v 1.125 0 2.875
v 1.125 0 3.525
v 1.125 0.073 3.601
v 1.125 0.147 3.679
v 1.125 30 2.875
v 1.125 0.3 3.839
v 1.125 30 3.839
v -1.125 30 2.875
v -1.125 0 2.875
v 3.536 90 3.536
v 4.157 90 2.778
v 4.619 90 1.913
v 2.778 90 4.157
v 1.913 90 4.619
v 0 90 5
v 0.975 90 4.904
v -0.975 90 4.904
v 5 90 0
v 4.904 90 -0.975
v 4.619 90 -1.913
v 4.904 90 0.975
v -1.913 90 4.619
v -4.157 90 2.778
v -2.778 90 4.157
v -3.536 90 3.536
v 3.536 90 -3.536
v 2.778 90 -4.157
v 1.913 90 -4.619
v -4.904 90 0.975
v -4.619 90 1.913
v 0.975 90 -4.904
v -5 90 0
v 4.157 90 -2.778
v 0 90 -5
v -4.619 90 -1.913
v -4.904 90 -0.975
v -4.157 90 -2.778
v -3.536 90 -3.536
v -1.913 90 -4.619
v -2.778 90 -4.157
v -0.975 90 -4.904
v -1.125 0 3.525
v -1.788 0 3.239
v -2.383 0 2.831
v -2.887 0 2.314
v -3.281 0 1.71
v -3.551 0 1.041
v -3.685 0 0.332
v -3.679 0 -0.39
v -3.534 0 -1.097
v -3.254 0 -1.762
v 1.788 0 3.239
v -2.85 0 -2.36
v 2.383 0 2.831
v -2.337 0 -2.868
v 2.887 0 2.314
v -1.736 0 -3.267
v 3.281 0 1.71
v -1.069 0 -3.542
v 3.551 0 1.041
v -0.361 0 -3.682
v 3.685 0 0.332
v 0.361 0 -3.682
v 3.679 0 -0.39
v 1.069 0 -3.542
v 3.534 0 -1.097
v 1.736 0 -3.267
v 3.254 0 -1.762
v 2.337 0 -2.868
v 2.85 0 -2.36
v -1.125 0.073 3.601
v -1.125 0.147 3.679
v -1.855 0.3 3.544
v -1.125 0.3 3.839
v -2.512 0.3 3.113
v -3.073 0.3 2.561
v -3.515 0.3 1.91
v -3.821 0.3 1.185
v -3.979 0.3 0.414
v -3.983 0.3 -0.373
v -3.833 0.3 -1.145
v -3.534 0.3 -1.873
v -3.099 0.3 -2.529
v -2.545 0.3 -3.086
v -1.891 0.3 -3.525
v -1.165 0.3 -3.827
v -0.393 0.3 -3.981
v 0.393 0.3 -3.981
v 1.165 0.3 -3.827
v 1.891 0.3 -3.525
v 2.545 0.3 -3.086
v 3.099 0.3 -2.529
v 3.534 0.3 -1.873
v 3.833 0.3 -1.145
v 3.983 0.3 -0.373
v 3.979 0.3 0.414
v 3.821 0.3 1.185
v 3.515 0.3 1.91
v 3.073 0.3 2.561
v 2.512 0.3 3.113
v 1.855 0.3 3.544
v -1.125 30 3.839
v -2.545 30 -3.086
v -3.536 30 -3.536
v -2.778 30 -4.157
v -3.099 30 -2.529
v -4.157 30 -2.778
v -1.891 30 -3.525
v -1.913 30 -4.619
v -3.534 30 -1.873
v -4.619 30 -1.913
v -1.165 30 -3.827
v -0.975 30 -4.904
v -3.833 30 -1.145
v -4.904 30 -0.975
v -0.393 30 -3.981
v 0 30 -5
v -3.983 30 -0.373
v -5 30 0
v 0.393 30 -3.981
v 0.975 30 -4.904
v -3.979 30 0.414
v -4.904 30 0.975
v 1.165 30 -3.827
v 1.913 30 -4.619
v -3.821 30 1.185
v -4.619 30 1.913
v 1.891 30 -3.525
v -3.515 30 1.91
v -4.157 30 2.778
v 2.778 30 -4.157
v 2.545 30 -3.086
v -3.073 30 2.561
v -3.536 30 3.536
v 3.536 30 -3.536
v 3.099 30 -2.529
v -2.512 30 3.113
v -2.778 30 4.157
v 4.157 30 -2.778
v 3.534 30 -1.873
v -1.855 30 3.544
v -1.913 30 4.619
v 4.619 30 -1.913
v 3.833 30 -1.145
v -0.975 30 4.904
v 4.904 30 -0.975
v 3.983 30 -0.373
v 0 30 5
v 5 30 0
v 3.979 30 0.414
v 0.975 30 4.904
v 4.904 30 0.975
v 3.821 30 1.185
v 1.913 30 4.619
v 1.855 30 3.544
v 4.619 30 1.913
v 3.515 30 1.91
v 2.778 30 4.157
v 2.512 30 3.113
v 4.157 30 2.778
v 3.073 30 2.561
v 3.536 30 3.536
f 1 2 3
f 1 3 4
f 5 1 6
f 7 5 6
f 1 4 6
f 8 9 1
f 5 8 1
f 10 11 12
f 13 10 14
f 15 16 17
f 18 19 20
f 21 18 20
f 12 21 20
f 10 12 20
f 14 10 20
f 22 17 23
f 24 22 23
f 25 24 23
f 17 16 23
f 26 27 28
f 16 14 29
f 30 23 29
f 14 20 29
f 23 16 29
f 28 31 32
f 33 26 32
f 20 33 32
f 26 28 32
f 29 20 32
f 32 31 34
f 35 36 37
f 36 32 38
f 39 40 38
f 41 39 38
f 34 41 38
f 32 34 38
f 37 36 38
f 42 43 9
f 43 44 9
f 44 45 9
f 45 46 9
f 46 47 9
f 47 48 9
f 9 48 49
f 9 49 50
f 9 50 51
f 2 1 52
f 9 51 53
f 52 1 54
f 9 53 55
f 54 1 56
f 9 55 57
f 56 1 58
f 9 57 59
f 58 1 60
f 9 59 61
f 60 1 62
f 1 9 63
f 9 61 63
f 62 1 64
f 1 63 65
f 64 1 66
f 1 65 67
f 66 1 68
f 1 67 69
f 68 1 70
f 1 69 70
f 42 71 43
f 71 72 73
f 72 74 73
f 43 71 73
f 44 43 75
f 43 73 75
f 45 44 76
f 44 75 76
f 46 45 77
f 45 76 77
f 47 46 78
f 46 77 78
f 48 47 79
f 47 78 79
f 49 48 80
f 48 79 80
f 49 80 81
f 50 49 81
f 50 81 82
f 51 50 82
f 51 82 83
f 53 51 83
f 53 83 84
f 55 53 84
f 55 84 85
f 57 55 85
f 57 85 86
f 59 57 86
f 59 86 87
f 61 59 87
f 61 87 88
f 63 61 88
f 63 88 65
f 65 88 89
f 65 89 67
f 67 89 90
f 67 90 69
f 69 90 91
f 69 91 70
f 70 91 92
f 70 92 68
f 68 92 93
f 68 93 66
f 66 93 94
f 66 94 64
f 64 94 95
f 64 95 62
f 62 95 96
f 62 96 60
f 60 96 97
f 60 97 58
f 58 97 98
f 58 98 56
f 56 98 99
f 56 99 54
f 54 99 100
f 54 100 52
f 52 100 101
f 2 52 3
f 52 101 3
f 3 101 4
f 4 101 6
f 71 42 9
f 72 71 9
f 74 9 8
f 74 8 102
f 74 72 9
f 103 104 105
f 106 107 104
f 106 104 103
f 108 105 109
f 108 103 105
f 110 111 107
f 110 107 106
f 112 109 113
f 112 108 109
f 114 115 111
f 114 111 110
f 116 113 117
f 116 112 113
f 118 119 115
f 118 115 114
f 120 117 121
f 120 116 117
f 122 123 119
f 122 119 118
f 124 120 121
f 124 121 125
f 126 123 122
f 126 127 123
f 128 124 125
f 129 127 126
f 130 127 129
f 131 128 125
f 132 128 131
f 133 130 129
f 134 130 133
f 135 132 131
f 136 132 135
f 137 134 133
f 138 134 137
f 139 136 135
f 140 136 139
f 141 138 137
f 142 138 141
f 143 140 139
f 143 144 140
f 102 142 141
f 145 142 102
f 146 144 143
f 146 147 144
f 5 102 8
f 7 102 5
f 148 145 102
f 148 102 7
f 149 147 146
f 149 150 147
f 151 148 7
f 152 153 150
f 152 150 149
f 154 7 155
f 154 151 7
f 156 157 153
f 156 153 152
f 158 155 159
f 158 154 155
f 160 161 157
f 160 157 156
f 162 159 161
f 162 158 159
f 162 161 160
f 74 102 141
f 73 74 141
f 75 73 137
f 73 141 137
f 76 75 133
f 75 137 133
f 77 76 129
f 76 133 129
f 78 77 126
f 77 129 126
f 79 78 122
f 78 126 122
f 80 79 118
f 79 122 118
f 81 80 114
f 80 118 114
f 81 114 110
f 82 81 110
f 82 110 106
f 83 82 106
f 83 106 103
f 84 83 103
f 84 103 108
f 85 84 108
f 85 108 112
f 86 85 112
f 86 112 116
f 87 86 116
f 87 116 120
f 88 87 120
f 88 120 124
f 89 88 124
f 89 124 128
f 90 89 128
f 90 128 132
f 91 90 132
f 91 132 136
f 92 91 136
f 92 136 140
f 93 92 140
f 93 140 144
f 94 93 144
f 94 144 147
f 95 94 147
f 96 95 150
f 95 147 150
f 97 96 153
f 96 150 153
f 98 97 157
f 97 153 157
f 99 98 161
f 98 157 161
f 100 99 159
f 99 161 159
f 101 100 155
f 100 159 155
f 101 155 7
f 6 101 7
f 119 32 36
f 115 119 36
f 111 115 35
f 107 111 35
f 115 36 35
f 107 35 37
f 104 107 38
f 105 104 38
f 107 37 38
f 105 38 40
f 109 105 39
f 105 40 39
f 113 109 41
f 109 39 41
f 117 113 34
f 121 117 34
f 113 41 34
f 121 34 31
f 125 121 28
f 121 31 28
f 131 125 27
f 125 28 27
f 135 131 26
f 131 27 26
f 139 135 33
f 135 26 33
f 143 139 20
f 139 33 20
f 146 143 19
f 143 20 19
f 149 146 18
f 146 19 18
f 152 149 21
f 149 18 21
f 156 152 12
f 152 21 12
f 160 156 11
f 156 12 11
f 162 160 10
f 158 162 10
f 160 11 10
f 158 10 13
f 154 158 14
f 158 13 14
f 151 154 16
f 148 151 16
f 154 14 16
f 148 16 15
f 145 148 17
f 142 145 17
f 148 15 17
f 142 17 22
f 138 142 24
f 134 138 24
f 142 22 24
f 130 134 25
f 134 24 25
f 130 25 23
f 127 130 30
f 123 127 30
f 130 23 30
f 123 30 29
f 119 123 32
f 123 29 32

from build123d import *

# Parameters (mm, degrees)
CHAMFER1_SIZE      = 0.3
SKETCH2_W          = 2.25
SKETCH2_H          = 2.25
CUT_EXTRUDE1_DEPTH = 30


with BuildPart() as part:
    # Sketch1 → Revolve1 (revolve)
    with BuildSketch(Plane.XY, mode=Mode.PRIVATE) as revolve1_sk:
        Polygon((0, 0), (4, 0), (4, 30), (5, 30), (5, 90), (0, 90), align=None)
    revolve(revolve1_sk.sketch.rotate(Axis((0, 90, 0), (0, -1, 0)), 180), axis=Axis((0, 90, 0), (0, -1, 0)))

    # Chamfer1
    chamfer1_edges = [part.edges().sort_by_distance(p)[0] for p in [
        (4, 0, 0),
    ]]
    chamfer(chamfer1_edges, length=CHAMFER1_SIZE)

    # Sketch2 → Cut-Extrude1 (cut)
    with BuildSketch(Plane.XZ):
        with Locations((0, 4)):
            Rectangle(SKETCH2_W, SKETCH2_H)
    extrude(amount=-CUT_EXTRUDE1_DEPTH, mode=Mode.SUBTRACT)


solid = part.part
